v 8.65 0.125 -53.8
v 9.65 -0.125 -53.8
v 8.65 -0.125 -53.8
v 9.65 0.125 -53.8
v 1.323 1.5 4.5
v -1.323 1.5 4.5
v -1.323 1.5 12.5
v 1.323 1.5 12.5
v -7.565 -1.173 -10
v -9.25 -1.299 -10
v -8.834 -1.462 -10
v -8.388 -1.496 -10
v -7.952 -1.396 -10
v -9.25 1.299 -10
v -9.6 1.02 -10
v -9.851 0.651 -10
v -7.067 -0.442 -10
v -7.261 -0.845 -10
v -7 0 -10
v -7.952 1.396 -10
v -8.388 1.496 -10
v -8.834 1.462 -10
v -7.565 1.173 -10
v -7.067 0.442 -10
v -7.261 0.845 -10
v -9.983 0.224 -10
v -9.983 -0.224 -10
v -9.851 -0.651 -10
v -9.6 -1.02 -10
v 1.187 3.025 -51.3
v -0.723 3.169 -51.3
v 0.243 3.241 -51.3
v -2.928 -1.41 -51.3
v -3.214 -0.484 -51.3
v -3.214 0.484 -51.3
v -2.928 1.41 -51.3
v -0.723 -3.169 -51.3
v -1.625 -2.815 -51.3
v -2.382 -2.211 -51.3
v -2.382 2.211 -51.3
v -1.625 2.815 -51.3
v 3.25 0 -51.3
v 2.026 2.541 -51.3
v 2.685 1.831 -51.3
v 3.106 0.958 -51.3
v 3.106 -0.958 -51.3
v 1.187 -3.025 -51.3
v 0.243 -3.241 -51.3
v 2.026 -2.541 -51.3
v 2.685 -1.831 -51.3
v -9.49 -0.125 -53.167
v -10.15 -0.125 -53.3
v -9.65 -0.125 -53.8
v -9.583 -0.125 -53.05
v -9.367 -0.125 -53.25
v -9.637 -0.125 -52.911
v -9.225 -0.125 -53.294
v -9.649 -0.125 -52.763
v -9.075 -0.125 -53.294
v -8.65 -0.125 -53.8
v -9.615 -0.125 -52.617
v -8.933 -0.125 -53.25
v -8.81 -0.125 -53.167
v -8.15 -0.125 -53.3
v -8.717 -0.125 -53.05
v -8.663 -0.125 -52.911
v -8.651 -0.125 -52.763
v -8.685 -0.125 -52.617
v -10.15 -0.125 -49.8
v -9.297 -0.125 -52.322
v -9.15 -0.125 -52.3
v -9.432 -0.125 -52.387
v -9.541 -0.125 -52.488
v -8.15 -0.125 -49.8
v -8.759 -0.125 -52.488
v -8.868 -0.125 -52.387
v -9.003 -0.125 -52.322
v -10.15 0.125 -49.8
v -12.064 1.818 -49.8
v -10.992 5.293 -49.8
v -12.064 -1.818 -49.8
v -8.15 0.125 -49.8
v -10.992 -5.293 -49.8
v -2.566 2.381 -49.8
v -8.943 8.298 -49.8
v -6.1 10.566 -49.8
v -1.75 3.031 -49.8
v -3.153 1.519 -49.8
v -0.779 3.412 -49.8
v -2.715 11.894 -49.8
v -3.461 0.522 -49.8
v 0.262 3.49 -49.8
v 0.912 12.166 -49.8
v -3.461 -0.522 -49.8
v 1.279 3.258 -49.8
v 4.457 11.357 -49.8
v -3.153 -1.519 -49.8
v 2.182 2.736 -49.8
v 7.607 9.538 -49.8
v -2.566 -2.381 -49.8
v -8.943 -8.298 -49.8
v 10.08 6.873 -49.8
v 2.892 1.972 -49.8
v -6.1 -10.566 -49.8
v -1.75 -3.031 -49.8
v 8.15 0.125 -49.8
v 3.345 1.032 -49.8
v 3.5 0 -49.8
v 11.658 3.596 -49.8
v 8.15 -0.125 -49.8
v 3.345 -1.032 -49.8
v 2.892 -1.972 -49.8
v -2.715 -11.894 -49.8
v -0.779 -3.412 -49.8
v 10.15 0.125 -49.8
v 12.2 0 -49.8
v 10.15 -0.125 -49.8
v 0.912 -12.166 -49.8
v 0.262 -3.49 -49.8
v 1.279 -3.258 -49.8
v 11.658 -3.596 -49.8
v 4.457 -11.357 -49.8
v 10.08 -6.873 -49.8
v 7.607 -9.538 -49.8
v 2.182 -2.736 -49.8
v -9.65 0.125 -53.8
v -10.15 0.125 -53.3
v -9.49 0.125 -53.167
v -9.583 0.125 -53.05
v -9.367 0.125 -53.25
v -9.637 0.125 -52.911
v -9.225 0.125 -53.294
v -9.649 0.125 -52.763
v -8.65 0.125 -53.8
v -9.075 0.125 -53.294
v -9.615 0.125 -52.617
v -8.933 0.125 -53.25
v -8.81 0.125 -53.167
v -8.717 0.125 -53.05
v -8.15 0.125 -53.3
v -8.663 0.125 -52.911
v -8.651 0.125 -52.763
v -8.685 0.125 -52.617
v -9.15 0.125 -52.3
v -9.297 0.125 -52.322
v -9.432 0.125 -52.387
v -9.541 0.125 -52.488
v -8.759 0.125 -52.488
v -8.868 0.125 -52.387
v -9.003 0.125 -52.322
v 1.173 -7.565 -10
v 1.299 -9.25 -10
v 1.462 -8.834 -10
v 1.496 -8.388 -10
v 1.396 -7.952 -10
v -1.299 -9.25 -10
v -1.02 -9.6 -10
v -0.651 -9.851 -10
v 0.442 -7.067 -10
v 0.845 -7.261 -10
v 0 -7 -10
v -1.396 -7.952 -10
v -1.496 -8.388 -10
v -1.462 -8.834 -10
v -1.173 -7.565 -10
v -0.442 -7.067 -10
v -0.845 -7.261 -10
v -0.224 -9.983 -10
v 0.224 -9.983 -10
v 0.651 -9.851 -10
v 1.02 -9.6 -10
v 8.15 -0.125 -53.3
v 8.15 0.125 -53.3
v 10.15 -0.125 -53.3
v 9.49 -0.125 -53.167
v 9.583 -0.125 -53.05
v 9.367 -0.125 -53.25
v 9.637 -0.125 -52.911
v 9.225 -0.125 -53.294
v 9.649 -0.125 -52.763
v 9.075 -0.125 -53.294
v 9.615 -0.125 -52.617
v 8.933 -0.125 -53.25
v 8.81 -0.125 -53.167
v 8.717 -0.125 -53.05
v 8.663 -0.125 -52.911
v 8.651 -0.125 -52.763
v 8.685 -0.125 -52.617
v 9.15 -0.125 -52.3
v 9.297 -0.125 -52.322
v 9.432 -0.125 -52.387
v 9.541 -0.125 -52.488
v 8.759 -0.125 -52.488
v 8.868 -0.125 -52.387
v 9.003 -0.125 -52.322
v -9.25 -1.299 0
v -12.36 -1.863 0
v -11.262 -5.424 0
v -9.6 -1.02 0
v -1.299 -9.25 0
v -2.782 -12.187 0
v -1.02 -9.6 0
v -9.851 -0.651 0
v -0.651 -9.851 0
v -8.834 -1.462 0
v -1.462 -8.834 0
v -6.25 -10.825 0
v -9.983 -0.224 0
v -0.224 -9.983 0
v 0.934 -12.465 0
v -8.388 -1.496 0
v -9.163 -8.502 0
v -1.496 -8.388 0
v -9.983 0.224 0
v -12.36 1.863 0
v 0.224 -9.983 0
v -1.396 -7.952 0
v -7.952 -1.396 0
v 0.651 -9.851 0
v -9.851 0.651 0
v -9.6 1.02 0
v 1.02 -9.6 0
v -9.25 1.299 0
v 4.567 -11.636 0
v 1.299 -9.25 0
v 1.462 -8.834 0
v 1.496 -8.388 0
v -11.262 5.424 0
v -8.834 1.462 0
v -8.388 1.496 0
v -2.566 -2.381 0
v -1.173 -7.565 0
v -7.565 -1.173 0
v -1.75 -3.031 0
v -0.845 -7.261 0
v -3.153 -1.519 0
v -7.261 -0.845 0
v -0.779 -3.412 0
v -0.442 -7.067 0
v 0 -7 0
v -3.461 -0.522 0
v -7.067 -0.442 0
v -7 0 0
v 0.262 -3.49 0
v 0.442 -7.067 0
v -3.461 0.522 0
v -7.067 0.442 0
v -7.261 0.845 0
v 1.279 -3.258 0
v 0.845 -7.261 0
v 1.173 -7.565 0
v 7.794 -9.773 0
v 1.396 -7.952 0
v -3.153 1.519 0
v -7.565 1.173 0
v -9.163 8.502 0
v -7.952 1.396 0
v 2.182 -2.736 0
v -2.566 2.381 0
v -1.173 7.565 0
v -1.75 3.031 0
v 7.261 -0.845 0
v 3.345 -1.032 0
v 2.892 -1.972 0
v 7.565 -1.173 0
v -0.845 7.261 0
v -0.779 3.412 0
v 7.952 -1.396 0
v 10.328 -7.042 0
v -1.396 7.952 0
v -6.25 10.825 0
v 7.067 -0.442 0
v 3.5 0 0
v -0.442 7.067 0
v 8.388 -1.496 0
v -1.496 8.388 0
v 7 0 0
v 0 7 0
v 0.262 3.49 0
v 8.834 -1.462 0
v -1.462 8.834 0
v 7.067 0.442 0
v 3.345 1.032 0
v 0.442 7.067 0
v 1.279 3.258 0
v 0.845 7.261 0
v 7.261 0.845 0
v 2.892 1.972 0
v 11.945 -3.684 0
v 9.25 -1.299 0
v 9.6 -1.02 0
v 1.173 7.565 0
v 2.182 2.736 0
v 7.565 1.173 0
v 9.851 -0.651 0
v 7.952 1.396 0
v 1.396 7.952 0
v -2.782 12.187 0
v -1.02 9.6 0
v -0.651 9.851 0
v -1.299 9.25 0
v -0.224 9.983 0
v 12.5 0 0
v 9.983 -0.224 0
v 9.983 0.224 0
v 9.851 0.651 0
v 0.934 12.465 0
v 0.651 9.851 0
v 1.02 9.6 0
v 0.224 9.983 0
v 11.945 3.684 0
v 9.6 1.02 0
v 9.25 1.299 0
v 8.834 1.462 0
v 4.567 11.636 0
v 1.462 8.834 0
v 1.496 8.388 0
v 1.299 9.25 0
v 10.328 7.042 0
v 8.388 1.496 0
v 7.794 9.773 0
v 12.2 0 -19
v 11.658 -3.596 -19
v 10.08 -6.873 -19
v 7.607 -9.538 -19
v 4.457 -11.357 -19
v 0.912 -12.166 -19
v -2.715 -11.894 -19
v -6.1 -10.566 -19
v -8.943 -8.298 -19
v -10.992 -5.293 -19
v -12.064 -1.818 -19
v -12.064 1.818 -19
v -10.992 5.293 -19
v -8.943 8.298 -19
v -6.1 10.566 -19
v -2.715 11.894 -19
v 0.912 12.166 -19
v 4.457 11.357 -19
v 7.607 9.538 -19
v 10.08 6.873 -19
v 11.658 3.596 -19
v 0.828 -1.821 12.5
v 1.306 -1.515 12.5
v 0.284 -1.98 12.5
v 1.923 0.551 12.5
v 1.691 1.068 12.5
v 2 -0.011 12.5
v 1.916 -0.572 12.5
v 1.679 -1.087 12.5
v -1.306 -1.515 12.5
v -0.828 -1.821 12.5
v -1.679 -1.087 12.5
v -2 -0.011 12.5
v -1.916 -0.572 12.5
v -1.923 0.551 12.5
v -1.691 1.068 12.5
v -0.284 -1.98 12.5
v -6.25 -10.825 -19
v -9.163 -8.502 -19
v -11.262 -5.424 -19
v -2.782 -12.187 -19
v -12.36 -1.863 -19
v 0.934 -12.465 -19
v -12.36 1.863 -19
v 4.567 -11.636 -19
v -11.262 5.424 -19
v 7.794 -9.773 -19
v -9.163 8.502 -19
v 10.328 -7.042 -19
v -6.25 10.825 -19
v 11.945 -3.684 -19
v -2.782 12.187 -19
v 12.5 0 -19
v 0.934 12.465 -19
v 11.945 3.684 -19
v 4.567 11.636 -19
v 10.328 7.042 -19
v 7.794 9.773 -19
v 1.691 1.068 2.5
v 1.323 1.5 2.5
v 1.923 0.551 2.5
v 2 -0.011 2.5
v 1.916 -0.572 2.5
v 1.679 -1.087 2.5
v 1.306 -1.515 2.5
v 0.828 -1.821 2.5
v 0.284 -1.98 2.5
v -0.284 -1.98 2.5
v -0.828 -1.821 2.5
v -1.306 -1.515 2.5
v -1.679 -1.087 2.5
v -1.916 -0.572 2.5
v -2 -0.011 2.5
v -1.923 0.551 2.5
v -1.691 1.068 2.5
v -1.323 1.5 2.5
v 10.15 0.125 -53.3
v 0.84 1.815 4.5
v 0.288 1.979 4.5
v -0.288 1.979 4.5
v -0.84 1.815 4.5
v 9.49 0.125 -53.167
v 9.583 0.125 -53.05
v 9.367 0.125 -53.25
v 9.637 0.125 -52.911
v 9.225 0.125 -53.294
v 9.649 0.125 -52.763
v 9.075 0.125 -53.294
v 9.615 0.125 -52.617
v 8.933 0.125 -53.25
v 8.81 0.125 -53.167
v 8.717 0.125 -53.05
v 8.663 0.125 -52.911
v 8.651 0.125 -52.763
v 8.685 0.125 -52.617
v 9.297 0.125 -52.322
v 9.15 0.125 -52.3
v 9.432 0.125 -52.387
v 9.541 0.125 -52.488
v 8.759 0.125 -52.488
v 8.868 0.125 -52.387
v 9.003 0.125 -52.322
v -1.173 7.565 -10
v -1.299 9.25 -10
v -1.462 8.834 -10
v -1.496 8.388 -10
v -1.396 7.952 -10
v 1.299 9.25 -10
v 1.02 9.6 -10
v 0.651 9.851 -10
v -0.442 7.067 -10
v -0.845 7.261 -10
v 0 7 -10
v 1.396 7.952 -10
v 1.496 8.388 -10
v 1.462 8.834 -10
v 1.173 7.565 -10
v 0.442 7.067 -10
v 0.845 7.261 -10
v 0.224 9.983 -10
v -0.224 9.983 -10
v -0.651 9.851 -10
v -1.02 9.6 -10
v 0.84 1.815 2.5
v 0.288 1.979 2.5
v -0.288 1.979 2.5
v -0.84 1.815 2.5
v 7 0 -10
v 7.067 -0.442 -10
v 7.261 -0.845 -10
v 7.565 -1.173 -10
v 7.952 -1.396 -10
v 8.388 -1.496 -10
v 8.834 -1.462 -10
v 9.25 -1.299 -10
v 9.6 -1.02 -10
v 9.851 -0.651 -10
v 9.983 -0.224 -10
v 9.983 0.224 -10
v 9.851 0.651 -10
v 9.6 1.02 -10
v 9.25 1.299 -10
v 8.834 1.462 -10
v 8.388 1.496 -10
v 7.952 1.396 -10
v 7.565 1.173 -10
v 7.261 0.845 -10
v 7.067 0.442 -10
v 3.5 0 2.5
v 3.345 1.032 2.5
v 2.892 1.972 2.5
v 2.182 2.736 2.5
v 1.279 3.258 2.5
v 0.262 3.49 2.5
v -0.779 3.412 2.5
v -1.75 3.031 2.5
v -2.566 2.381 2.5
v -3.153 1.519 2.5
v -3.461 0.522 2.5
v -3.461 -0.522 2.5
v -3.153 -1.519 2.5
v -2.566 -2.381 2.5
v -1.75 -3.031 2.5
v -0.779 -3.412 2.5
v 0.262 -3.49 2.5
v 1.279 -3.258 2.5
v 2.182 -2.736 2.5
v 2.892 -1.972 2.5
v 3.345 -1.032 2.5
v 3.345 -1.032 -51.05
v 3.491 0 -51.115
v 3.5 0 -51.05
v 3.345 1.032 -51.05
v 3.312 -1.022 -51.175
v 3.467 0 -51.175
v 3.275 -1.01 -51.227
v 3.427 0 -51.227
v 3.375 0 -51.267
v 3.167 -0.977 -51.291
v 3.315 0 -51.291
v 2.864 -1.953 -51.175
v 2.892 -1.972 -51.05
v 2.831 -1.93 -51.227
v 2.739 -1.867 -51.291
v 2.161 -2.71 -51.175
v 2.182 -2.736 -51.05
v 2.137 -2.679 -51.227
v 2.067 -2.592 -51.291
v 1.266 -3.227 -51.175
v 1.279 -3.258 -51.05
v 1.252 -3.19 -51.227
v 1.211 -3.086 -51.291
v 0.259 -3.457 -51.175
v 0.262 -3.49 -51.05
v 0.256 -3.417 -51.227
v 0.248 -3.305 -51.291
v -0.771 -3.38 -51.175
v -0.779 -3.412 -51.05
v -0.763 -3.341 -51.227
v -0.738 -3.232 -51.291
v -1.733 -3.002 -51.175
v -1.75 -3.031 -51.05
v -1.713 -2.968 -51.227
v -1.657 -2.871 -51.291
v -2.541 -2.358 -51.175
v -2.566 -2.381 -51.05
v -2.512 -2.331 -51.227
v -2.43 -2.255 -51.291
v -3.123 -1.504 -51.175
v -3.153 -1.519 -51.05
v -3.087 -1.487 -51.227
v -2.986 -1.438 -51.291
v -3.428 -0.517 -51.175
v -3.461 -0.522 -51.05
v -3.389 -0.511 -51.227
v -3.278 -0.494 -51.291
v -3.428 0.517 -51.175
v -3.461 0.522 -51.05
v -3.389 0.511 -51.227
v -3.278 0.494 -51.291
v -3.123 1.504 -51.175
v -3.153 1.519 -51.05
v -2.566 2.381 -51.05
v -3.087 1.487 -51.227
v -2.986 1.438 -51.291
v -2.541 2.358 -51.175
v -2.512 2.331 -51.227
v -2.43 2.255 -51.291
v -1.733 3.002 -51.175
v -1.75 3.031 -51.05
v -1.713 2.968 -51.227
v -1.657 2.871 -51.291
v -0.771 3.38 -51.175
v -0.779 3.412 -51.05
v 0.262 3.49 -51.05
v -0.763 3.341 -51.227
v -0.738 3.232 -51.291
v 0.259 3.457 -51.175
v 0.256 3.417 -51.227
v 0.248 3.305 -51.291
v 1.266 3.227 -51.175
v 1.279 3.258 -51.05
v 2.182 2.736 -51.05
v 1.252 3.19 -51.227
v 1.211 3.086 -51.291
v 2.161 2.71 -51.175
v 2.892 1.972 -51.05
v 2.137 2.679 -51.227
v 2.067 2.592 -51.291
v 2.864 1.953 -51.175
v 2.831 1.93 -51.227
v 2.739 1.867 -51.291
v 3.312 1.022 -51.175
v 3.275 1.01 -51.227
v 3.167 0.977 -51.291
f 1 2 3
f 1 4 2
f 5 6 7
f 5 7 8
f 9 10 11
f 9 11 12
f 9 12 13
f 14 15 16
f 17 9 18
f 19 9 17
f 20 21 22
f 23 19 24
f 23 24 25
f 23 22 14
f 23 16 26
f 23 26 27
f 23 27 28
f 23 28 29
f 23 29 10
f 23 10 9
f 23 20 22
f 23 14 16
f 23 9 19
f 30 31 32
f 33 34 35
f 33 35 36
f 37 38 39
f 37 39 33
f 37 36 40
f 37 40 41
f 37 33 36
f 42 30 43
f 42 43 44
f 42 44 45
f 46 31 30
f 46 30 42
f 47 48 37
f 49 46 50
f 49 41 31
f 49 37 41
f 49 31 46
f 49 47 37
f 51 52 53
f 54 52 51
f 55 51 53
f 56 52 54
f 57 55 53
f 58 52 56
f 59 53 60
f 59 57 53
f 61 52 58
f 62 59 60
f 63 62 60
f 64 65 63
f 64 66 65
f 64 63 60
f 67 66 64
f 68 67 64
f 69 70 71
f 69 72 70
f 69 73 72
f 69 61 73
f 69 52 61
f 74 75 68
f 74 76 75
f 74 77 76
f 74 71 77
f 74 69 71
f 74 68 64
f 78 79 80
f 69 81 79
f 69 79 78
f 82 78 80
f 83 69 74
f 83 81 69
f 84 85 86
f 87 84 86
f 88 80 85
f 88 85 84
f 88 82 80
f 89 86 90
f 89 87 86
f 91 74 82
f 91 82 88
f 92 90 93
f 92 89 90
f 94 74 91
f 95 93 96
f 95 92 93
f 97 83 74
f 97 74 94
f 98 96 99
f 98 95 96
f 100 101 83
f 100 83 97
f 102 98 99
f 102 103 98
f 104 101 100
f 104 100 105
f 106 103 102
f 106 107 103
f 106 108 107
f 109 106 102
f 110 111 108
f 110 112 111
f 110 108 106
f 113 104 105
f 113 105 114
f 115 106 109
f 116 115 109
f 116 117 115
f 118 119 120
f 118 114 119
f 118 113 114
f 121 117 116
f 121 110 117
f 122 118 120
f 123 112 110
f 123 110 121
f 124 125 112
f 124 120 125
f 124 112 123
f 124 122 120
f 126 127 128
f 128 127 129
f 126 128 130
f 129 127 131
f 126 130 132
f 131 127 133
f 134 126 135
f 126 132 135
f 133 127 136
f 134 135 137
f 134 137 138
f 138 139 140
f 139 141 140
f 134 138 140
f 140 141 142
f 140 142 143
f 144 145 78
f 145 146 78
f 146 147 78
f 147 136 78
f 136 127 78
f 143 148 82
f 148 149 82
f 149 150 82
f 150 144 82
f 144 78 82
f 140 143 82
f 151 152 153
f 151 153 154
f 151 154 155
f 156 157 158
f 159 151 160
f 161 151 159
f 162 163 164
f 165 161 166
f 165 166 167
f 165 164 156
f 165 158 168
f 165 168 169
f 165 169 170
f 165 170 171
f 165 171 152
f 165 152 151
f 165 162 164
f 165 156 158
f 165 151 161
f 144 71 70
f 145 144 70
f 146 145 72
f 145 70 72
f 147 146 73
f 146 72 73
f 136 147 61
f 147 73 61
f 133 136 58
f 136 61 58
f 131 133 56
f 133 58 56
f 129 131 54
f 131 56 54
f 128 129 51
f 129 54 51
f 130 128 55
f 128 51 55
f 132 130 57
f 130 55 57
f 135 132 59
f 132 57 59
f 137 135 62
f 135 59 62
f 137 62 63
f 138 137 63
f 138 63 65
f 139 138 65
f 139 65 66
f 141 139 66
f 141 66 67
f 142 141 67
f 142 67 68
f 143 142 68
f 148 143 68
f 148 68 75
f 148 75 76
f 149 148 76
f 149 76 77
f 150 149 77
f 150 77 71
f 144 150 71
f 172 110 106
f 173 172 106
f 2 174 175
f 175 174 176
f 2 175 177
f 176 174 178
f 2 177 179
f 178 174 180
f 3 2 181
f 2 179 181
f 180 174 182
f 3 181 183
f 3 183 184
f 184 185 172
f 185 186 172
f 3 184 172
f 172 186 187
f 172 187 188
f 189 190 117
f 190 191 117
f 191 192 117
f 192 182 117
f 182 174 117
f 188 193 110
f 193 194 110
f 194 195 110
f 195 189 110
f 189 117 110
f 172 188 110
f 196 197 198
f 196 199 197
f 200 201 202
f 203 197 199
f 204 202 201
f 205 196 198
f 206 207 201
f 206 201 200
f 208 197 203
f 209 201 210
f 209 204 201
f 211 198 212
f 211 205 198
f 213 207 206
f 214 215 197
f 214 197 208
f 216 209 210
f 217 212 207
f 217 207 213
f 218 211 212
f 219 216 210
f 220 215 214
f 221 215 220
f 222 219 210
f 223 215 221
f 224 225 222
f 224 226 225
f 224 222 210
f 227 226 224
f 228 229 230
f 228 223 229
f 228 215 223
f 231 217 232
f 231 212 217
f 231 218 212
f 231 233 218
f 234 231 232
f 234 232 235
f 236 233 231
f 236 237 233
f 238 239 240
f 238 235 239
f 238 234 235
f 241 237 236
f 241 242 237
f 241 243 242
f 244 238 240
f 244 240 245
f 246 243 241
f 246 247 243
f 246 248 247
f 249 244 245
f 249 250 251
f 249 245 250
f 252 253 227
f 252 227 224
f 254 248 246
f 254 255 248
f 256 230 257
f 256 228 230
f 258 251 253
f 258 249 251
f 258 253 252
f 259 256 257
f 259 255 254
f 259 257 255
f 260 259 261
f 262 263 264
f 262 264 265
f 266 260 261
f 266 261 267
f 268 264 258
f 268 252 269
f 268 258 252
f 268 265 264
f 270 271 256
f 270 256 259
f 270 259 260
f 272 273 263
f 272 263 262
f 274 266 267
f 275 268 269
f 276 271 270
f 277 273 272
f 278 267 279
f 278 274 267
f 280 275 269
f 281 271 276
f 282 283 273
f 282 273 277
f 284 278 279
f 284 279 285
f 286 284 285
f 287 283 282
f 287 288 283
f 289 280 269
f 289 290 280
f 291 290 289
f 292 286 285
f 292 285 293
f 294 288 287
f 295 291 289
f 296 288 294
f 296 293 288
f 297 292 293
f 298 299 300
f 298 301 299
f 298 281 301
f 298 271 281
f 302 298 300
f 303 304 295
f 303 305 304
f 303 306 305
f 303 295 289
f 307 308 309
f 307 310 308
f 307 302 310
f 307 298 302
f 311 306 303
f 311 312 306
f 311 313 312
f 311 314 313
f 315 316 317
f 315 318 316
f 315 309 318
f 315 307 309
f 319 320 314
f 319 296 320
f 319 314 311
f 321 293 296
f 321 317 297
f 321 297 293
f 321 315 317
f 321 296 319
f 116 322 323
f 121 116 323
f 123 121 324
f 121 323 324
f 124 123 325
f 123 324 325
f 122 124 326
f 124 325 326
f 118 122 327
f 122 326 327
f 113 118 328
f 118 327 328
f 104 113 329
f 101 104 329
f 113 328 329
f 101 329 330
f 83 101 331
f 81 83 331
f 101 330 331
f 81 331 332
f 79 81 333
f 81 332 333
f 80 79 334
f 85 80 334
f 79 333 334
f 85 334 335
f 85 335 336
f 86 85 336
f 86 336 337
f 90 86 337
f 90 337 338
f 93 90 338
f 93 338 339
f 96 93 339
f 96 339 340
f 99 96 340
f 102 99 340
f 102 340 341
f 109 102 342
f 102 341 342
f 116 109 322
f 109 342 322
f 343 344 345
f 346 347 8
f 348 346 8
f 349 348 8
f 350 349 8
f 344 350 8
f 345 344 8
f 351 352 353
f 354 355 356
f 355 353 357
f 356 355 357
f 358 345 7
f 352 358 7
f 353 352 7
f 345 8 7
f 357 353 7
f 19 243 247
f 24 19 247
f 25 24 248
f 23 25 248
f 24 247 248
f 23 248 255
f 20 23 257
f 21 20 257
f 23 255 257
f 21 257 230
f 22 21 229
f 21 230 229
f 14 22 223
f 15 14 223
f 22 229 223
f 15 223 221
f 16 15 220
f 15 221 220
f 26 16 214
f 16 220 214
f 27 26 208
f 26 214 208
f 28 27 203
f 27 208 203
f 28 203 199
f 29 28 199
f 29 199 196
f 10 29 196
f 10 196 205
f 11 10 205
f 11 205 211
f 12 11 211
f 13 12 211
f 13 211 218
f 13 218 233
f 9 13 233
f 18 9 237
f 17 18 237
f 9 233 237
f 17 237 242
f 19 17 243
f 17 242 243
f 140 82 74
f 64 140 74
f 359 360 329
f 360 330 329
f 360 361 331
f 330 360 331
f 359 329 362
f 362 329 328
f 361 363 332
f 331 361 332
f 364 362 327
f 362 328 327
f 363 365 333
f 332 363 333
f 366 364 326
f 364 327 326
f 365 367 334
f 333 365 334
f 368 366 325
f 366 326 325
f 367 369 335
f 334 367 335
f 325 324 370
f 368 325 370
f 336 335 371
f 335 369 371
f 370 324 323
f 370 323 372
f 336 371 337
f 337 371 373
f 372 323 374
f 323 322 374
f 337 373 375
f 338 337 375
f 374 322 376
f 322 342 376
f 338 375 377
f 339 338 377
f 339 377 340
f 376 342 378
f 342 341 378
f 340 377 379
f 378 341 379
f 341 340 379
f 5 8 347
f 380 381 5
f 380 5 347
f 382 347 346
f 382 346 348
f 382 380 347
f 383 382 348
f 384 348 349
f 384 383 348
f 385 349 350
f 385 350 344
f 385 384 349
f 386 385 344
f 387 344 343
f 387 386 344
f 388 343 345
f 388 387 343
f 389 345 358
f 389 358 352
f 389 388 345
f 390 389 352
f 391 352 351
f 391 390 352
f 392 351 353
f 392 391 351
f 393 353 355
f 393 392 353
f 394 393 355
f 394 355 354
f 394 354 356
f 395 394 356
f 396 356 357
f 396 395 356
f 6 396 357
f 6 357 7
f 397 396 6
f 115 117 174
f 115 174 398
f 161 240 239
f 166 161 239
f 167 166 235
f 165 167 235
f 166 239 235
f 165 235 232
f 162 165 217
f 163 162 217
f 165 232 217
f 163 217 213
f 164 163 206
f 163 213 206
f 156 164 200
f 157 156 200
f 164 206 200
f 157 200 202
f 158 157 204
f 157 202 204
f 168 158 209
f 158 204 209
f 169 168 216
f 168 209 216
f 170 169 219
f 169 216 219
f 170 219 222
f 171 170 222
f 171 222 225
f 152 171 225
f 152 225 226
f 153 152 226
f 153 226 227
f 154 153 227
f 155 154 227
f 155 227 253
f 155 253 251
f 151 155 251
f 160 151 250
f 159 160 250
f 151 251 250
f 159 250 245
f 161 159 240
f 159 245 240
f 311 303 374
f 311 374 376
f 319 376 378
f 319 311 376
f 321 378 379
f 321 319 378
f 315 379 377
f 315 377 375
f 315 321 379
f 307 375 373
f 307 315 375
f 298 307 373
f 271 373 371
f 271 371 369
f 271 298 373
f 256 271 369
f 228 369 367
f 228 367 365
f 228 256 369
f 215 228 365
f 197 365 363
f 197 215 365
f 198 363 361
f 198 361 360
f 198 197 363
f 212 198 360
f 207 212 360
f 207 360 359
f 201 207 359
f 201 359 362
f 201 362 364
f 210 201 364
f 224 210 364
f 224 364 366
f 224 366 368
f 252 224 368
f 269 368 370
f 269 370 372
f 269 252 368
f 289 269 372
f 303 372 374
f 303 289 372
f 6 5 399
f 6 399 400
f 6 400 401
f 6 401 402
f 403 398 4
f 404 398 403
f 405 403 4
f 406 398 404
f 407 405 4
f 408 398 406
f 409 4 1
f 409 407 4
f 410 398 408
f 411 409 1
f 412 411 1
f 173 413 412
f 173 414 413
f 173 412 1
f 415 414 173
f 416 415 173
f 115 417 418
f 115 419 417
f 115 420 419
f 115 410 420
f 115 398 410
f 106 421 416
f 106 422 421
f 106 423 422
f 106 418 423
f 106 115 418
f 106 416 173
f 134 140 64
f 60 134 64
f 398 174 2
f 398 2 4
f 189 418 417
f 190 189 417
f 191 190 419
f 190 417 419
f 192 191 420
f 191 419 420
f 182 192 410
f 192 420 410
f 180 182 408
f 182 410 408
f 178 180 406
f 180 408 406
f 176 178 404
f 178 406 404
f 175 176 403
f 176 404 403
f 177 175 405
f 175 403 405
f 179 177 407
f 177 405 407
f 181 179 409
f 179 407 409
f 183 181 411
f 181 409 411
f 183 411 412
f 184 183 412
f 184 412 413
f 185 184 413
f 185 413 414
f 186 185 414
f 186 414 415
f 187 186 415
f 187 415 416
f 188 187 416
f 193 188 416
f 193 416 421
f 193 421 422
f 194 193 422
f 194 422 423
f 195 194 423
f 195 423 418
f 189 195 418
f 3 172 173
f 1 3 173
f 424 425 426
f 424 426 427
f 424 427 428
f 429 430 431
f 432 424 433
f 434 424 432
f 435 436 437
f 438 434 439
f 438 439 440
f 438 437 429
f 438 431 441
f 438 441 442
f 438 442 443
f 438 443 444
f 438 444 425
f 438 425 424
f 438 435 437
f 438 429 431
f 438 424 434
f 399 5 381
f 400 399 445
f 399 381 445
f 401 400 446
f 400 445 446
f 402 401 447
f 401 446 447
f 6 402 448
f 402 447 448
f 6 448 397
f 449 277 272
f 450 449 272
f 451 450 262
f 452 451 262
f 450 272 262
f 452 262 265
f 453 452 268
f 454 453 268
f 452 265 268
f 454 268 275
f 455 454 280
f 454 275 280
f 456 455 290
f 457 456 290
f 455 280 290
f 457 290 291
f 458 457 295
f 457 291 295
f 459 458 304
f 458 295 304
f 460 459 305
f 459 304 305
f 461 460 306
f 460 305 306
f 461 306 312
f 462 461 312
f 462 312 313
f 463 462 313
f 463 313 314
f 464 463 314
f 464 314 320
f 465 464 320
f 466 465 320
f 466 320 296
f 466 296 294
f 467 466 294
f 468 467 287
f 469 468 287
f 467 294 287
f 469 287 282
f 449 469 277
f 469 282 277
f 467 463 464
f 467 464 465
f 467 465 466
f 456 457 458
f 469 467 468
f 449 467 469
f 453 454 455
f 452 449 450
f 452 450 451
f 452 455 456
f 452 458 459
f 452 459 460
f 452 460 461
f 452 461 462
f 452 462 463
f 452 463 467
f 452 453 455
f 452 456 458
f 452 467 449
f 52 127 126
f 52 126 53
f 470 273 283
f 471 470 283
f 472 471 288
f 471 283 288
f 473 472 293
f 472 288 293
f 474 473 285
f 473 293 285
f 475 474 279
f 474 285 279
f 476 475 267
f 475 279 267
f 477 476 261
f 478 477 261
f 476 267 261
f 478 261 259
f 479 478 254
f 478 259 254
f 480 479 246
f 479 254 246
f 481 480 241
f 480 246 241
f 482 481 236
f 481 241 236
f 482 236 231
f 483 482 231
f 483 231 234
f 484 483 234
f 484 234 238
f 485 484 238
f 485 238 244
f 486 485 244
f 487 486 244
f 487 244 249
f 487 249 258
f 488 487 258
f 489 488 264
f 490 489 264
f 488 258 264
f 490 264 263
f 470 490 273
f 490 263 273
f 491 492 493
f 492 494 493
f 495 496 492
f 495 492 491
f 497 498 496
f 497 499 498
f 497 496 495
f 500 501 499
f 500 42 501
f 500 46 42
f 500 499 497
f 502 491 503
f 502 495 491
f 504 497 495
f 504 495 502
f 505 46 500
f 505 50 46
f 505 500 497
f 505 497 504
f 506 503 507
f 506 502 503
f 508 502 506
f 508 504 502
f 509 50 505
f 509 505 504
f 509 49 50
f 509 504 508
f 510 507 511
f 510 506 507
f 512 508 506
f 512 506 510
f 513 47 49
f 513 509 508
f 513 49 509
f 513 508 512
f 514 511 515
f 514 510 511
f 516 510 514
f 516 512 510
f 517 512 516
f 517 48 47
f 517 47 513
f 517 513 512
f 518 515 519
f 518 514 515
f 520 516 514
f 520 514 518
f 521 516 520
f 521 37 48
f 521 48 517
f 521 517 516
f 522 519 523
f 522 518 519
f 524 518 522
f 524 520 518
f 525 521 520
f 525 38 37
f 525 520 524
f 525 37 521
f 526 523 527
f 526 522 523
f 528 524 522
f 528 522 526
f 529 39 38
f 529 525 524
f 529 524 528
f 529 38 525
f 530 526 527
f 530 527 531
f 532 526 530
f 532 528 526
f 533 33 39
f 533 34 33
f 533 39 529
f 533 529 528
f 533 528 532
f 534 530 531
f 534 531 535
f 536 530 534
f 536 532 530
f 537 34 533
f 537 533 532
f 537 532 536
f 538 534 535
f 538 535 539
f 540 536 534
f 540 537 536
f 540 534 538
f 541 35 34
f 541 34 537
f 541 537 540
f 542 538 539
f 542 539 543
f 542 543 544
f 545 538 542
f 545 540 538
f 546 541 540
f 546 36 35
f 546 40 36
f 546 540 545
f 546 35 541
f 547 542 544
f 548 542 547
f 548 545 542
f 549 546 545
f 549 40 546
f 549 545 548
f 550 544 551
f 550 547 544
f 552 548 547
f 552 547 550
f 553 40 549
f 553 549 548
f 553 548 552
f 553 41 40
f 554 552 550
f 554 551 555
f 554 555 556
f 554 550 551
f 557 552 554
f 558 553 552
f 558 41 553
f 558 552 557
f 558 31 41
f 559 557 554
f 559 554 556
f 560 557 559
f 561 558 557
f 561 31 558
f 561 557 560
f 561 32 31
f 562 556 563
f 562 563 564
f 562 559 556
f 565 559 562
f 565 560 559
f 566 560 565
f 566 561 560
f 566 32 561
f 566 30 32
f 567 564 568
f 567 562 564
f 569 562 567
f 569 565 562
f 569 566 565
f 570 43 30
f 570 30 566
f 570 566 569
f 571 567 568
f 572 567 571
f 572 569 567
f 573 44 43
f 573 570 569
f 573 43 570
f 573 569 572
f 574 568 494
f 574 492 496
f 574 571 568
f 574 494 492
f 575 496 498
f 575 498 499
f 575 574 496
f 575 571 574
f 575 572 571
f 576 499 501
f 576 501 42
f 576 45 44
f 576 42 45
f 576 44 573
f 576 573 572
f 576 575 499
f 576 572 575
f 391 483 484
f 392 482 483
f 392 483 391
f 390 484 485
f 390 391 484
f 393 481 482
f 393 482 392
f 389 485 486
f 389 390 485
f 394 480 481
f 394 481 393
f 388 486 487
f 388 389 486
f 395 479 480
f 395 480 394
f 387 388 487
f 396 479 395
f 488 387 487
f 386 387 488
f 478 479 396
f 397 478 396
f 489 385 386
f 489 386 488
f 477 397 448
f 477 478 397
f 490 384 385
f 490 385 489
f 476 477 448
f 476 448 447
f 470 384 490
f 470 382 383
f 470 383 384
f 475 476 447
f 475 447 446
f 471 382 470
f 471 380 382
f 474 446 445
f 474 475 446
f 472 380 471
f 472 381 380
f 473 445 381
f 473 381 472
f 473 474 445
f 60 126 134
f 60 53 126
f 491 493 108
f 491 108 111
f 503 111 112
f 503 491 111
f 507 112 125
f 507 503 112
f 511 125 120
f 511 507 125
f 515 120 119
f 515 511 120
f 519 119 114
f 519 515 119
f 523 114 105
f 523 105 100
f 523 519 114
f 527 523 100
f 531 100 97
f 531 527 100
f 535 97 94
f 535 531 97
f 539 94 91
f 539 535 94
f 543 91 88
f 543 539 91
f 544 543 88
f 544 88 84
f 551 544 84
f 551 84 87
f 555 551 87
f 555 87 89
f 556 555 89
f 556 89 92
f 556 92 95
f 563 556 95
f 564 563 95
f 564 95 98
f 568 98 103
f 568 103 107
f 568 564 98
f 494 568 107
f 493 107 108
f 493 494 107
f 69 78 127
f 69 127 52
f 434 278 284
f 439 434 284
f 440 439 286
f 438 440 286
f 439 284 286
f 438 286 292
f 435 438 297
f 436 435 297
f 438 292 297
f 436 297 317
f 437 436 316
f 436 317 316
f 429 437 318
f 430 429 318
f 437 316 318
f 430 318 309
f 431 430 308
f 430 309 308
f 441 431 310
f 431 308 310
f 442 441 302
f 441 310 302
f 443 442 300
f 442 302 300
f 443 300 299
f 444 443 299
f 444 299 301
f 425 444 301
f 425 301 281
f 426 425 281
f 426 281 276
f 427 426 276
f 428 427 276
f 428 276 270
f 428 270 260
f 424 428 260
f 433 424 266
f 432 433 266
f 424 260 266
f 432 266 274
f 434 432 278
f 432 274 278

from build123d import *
from build123d.topology import SkipClean

# Parameters (mm, degrees)
SKETCH1_R                    = 12.5
BOSS_EXTRUDE1_DEPTH          = 19
SKETCH2_R                    = 12.2
BOSS_EXTRUDE2_DEPTH          = 30.8
SKETCH3_R                    = 1.5
CUT_EXTRUDE1_DEPTH           = 10
CIRPATTERN1_COUNT            = 4
SKETCH4_R                    = 3.5
BOSS_EXTRUDE3_DEPTH          = 2.5
BOSS_EXTRUDE4_DEPTH          = 10
SKETCH7_R                    = 2
BOSS_EXTRUDE5_DEPTH          = 2
SKETCH8_W                    = 2
SKETCH8_H                    = 0.25
BOSS_EXTRUDE6_DEPTH          = 4
CHAMFER1_SIZE                = 0.5
CUT_EXTRUDE2_REACH           = 58.658
SKETCH10_R                   = 0.5
CIRPATTERN2_COUNT            = 2
CHAMFER1_OF_CIRPATTERN2_SIZE = 0.5
BOSS_EXTRUDE7_START          = 1.5
SKETCH11_R                   = 3.5
BOSS_EXTRUDE7_DEPTH          = 1.5
FILLET1_R                    = 0.25


with BuildPart() as part:
    # Sketch1 → Boss-Extrude1 (new body)
    with BuildSketch(Plane.XY):
        Circle(SKETCH1_R)
    extrude(amount=-BOSS_EXTRUDE1_DEPTH)

    # Sketch2 → Boss-Extrude2 (add)
    with BuildSketch(Plane(origin=(0, 0, -19), x_dir=(-1, 0, 0), z_dir=(0, 0, -1))):
        Circle(SKETCH2_R)
    extrude(amount=BOSS_EXTRUDE2_DEPTH)

    # Sketch3 → Cut-Extrude1 (cut)
    with BuildSketch(Plane.XY):
        with Locations((-8.5, 0)):
            Circle(SKETCH3_R)
    cut_extrude1 = extrude(amount=-CUT_EXTRUDE1_DEPTH, mode=Mode.SUBTRACT)

    # CirPattern1: Cut-Extrude1 ×4 about axis
    cirpattern1_axis = Axis((0, 0, -19), (0, 0, 1))
    for i in range(1, CIRPATTERN1_COUNT):
        add(cut_extrude1.rotate(cirpattern1_axis, i * 360 / CIRPATTERN1_COUNT), mode=Mode.SUBTRACT)

    # Sketch4 → Boss-Extrude3 (add)
    with BuildSketch(Plane.XY):
        Circle(SKETCH4_R)
    extrude(amount=BOSS_EXTRUDE3_DEPTH)

    # Sketch6 → Boss-Extrude4 (add)
    with BuildSketch(Plane.XY.offset(2.5)):
        with BuildLine():
            Line((-1.322875656, 1.5), (1.322875656, 1.5))
            ThreePointArc((1.322875656, 1.5), (0, -2), (-1.322875656, 1.5))
        make_face()
    extrude(amount=BOSS_EXTRUDE4_DEPTH)

    # Sketch7 → Boss-Extrude5 (add)
    with SkipClean():  # the faces are left unmerged after this step: merging them gives an invalid solid
        with BuildSketch(Plane.XY.offset(2.5)):
            Circle(SKETCH7_R)
        extrude(amount=BOSS_EXTRUDE5_DEPTH)

    # Sketch8 → Boss-Extrude6 (add)
    with SkipClean():  # the faces are left unmerged after this step: merging them gives an invalid solid
        with BuildSketch(Plane(origin=(0, 0, -49.8), x_dir=(-1, 0, 0), z_dir=(0, 0, -1))):
            with Locations((-9.15, 0)):
                Rectangle(SKETCH8_W, SKETCH8_H)
        boss_extrude6 = extrude(amount=BOSS_EXTRUDE6_DEPTH)

    # Chamfer1
    chamfer1_edges = [part.edges().sort_by_distance(p)[0] for p in [
        (10.15, 0, -53.8),
        (8.15, 0, -53.8),
    ]]
    chamfer(chamfer1_edges, length=CHAMFER1_SIZE)

    # Sketch10 → Cut-Extrude2 (cut, up to next)
    with BuildSketch(Plane(origin=(0, 0.125, 0), x_dir=(1, 0, 0), z_dir=(0, 1, 0)), mode=Mode.PRIVATE) as cut_extrude2_sk1:
        with Locations((9.15, 52.8)):
            Circle(SKETCH10_R)
    cut_extrude2_tool1 = extrude(cut_extrude2_sk1.sketch, amount=-CUT_EXTRUDE2_REACH, mode=Mode.PRIVATE) & part.part
    cut_extrude2 = cut_extrude2_tool1.solids().sort_by_distance((9.15, 0.125, -52.8))[0]
    add(cut_extrude2, mode=Mode.SUBTRACT)

    # CirPattern2: Boss-Extrude6, Cut-Extrude2 ×2 about axis
    with SkipClean():  # the faces are left unmerged after this step: merging them gives an invalid solid
        cirpattern2_axis = Axis((0, 0, -19), (0, 0, 1))
        add([boss_extrude6.rotate(cirpattern2_axis, i * 360 / CIRPATTERN2_COUNT) for i in range(1, CIRPATTERN2_COUNT)])
        add([cut_extrude2.rotate(cirpattern2_axis, i * 360 / CIRPATTERN2_COUNT) for i in range(1, CIRPATTERN2_COUNT)], mode=Mode.SUBTRACT)

    # Chamfer1 of CirPattern2
    chamfer1_of_cirpattern2_edges = [part.edges().sort_by_distance(p)[0] for p in [
        (-10.15, 0, -53.8),
        (-8.15, 0, -53.8),
    ]]
    chamfer(chamfer1_of_cirpattern2_edges, length=CHAMFER1_OF_CIRPATTERN2_SIZE)

    # Sketch11 → Boss-Extrude7 (add)
    with SkipClean():  # the faces are left unmerged after this step: merging them gives an invalid solid
        with BuildSketch(Plane(origin=(0, 0, -49.8), x_dir=(-1, 0, 0), z_dir=(0, 0, -1)).offset(BOSS_EXTRUDE7_START)):
            Circle(SKETCH11_R)
        extrude(amount=-BOSS_EXTRUDE7_DEPTH)

    # Fillet1
    fillet1_edges = [part.edges().sort_by_distance(p)[0] for p in [
        (3.5, 0, -51.3),
    ]]
    fillet(fillet1_edges, radius=FILLET1_R)


solid = part.part
